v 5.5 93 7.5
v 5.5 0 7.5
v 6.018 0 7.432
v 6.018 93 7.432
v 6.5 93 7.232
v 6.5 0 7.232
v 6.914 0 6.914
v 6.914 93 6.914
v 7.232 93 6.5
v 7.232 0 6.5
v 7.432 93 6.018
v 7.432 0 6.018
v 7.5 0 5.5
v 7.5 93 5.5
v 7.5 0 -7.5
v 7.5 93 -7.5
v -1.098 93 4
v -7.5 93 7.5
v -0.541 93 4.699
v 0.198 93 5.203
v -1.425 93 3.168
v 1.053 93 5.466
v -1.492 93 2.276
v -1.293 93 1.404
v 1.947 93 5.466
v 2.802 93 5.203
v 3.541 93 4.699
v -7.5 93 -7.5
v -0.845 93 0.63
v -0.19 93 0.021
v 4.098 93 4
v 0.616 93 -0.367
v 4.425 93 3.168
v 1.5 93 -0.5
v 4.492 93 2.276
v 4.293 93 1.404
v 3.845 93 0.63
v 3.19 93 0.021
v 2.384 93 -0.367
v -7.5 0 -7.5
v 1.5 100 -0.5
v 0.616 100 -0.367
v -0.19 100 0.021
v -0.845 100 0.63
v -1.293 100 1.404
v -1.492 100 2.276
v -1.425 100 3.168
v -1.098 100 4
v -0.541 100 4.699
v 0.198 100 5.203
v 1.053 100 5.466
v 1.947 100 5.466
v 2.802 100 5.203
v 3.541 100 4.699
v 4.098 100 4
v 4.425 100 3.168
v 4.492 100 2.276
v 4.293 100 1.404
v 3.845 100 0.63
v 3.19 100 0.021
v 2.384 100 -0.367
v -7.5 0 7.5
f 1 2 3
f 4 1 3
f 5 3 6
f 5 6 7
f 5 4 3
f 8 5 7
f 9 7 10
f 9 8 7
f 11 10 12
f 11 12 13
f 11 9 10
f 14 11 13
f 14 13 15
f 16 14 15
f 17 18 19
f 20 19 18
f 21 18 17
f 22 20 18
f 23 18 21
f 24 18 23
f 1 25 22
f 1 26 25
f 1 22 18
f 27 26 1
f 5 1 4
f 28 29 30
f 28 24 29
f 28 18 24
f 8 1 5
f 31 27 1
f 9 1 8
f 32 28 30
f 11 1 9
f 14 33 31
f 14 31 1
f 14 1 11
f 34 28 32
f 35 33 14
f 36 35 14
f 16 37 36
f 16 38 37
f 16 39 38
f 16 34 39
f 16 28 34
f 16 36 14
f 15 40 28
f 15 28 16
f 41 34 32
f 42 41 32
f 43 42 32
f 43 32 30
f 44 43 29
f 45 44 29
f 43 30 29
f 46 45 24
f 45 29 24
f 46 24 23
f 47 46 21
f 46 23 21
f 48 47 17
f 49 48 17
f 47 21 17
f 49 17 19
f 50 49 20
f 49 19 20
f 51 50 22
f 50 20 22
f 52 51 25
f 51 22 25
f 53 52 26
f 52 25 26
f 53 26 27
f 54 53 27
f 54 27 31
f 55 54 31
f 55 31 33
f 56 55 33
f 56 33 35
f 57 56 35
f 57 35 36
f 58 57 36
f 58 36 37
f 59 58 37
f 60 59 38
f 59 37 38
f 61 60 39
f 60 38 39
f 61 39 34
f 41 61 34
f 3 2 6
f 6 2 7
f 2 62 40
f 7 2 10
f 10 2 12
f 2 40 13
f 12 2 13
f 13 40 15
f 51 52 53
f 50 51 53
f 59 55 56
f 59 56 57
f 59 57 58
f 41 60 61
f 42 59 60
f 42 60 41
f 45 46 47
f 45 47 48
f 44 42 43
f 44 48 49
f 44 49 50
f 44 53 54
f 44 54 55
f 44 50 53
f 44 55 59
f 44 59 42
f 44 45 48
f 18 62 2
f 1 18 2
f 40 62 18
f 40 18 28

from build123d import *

# Parameters (mm, degrees)
SKETCH1_W           = 15
SKETCH1_H           = 15
BOSS_EXTRUDE1_DEPTH = 93
SKETCH2_R           = 3
BOSS_EXTRUDE2_DEPTH = 7
FILLET1_R           = 2


with BuildPart() as part:
    # Sketch1 → Boss-Extrude1 (new body)
    with BuildSketch(Plane(origin=(0, 0, 0), x_dir=(1, 0, 0), z_dir=(0, 1, 0))):
        Rectangle(SKETCH1_W, SKETCH1_H)
    extrude(amount=BOSS_EXTRUDE1_DEPTH)

    # Sketch2 → Boss-Extrude2 (add)
    with BuildSketch(Plane(origin=(0, 93, 0), x_dir=(1, 0, 0), z_dir=(0, 1, 0))):
        with Locations(Location((1.5, -2.5, 0), (0, 0, 90))):
            Circle(SKETCH2_R)
    extrude(amount=BOSS_EXTRUDE2_DEPTH)

    # Fillet1
    fillet1_edges = [part.edges().sort_by_distance(p)[0] for p in [
        (7.5, 46.5, 7.5),
    ]]
    fillet(fillet1_edges, radius=FILLET1_R)


solid = part.part
